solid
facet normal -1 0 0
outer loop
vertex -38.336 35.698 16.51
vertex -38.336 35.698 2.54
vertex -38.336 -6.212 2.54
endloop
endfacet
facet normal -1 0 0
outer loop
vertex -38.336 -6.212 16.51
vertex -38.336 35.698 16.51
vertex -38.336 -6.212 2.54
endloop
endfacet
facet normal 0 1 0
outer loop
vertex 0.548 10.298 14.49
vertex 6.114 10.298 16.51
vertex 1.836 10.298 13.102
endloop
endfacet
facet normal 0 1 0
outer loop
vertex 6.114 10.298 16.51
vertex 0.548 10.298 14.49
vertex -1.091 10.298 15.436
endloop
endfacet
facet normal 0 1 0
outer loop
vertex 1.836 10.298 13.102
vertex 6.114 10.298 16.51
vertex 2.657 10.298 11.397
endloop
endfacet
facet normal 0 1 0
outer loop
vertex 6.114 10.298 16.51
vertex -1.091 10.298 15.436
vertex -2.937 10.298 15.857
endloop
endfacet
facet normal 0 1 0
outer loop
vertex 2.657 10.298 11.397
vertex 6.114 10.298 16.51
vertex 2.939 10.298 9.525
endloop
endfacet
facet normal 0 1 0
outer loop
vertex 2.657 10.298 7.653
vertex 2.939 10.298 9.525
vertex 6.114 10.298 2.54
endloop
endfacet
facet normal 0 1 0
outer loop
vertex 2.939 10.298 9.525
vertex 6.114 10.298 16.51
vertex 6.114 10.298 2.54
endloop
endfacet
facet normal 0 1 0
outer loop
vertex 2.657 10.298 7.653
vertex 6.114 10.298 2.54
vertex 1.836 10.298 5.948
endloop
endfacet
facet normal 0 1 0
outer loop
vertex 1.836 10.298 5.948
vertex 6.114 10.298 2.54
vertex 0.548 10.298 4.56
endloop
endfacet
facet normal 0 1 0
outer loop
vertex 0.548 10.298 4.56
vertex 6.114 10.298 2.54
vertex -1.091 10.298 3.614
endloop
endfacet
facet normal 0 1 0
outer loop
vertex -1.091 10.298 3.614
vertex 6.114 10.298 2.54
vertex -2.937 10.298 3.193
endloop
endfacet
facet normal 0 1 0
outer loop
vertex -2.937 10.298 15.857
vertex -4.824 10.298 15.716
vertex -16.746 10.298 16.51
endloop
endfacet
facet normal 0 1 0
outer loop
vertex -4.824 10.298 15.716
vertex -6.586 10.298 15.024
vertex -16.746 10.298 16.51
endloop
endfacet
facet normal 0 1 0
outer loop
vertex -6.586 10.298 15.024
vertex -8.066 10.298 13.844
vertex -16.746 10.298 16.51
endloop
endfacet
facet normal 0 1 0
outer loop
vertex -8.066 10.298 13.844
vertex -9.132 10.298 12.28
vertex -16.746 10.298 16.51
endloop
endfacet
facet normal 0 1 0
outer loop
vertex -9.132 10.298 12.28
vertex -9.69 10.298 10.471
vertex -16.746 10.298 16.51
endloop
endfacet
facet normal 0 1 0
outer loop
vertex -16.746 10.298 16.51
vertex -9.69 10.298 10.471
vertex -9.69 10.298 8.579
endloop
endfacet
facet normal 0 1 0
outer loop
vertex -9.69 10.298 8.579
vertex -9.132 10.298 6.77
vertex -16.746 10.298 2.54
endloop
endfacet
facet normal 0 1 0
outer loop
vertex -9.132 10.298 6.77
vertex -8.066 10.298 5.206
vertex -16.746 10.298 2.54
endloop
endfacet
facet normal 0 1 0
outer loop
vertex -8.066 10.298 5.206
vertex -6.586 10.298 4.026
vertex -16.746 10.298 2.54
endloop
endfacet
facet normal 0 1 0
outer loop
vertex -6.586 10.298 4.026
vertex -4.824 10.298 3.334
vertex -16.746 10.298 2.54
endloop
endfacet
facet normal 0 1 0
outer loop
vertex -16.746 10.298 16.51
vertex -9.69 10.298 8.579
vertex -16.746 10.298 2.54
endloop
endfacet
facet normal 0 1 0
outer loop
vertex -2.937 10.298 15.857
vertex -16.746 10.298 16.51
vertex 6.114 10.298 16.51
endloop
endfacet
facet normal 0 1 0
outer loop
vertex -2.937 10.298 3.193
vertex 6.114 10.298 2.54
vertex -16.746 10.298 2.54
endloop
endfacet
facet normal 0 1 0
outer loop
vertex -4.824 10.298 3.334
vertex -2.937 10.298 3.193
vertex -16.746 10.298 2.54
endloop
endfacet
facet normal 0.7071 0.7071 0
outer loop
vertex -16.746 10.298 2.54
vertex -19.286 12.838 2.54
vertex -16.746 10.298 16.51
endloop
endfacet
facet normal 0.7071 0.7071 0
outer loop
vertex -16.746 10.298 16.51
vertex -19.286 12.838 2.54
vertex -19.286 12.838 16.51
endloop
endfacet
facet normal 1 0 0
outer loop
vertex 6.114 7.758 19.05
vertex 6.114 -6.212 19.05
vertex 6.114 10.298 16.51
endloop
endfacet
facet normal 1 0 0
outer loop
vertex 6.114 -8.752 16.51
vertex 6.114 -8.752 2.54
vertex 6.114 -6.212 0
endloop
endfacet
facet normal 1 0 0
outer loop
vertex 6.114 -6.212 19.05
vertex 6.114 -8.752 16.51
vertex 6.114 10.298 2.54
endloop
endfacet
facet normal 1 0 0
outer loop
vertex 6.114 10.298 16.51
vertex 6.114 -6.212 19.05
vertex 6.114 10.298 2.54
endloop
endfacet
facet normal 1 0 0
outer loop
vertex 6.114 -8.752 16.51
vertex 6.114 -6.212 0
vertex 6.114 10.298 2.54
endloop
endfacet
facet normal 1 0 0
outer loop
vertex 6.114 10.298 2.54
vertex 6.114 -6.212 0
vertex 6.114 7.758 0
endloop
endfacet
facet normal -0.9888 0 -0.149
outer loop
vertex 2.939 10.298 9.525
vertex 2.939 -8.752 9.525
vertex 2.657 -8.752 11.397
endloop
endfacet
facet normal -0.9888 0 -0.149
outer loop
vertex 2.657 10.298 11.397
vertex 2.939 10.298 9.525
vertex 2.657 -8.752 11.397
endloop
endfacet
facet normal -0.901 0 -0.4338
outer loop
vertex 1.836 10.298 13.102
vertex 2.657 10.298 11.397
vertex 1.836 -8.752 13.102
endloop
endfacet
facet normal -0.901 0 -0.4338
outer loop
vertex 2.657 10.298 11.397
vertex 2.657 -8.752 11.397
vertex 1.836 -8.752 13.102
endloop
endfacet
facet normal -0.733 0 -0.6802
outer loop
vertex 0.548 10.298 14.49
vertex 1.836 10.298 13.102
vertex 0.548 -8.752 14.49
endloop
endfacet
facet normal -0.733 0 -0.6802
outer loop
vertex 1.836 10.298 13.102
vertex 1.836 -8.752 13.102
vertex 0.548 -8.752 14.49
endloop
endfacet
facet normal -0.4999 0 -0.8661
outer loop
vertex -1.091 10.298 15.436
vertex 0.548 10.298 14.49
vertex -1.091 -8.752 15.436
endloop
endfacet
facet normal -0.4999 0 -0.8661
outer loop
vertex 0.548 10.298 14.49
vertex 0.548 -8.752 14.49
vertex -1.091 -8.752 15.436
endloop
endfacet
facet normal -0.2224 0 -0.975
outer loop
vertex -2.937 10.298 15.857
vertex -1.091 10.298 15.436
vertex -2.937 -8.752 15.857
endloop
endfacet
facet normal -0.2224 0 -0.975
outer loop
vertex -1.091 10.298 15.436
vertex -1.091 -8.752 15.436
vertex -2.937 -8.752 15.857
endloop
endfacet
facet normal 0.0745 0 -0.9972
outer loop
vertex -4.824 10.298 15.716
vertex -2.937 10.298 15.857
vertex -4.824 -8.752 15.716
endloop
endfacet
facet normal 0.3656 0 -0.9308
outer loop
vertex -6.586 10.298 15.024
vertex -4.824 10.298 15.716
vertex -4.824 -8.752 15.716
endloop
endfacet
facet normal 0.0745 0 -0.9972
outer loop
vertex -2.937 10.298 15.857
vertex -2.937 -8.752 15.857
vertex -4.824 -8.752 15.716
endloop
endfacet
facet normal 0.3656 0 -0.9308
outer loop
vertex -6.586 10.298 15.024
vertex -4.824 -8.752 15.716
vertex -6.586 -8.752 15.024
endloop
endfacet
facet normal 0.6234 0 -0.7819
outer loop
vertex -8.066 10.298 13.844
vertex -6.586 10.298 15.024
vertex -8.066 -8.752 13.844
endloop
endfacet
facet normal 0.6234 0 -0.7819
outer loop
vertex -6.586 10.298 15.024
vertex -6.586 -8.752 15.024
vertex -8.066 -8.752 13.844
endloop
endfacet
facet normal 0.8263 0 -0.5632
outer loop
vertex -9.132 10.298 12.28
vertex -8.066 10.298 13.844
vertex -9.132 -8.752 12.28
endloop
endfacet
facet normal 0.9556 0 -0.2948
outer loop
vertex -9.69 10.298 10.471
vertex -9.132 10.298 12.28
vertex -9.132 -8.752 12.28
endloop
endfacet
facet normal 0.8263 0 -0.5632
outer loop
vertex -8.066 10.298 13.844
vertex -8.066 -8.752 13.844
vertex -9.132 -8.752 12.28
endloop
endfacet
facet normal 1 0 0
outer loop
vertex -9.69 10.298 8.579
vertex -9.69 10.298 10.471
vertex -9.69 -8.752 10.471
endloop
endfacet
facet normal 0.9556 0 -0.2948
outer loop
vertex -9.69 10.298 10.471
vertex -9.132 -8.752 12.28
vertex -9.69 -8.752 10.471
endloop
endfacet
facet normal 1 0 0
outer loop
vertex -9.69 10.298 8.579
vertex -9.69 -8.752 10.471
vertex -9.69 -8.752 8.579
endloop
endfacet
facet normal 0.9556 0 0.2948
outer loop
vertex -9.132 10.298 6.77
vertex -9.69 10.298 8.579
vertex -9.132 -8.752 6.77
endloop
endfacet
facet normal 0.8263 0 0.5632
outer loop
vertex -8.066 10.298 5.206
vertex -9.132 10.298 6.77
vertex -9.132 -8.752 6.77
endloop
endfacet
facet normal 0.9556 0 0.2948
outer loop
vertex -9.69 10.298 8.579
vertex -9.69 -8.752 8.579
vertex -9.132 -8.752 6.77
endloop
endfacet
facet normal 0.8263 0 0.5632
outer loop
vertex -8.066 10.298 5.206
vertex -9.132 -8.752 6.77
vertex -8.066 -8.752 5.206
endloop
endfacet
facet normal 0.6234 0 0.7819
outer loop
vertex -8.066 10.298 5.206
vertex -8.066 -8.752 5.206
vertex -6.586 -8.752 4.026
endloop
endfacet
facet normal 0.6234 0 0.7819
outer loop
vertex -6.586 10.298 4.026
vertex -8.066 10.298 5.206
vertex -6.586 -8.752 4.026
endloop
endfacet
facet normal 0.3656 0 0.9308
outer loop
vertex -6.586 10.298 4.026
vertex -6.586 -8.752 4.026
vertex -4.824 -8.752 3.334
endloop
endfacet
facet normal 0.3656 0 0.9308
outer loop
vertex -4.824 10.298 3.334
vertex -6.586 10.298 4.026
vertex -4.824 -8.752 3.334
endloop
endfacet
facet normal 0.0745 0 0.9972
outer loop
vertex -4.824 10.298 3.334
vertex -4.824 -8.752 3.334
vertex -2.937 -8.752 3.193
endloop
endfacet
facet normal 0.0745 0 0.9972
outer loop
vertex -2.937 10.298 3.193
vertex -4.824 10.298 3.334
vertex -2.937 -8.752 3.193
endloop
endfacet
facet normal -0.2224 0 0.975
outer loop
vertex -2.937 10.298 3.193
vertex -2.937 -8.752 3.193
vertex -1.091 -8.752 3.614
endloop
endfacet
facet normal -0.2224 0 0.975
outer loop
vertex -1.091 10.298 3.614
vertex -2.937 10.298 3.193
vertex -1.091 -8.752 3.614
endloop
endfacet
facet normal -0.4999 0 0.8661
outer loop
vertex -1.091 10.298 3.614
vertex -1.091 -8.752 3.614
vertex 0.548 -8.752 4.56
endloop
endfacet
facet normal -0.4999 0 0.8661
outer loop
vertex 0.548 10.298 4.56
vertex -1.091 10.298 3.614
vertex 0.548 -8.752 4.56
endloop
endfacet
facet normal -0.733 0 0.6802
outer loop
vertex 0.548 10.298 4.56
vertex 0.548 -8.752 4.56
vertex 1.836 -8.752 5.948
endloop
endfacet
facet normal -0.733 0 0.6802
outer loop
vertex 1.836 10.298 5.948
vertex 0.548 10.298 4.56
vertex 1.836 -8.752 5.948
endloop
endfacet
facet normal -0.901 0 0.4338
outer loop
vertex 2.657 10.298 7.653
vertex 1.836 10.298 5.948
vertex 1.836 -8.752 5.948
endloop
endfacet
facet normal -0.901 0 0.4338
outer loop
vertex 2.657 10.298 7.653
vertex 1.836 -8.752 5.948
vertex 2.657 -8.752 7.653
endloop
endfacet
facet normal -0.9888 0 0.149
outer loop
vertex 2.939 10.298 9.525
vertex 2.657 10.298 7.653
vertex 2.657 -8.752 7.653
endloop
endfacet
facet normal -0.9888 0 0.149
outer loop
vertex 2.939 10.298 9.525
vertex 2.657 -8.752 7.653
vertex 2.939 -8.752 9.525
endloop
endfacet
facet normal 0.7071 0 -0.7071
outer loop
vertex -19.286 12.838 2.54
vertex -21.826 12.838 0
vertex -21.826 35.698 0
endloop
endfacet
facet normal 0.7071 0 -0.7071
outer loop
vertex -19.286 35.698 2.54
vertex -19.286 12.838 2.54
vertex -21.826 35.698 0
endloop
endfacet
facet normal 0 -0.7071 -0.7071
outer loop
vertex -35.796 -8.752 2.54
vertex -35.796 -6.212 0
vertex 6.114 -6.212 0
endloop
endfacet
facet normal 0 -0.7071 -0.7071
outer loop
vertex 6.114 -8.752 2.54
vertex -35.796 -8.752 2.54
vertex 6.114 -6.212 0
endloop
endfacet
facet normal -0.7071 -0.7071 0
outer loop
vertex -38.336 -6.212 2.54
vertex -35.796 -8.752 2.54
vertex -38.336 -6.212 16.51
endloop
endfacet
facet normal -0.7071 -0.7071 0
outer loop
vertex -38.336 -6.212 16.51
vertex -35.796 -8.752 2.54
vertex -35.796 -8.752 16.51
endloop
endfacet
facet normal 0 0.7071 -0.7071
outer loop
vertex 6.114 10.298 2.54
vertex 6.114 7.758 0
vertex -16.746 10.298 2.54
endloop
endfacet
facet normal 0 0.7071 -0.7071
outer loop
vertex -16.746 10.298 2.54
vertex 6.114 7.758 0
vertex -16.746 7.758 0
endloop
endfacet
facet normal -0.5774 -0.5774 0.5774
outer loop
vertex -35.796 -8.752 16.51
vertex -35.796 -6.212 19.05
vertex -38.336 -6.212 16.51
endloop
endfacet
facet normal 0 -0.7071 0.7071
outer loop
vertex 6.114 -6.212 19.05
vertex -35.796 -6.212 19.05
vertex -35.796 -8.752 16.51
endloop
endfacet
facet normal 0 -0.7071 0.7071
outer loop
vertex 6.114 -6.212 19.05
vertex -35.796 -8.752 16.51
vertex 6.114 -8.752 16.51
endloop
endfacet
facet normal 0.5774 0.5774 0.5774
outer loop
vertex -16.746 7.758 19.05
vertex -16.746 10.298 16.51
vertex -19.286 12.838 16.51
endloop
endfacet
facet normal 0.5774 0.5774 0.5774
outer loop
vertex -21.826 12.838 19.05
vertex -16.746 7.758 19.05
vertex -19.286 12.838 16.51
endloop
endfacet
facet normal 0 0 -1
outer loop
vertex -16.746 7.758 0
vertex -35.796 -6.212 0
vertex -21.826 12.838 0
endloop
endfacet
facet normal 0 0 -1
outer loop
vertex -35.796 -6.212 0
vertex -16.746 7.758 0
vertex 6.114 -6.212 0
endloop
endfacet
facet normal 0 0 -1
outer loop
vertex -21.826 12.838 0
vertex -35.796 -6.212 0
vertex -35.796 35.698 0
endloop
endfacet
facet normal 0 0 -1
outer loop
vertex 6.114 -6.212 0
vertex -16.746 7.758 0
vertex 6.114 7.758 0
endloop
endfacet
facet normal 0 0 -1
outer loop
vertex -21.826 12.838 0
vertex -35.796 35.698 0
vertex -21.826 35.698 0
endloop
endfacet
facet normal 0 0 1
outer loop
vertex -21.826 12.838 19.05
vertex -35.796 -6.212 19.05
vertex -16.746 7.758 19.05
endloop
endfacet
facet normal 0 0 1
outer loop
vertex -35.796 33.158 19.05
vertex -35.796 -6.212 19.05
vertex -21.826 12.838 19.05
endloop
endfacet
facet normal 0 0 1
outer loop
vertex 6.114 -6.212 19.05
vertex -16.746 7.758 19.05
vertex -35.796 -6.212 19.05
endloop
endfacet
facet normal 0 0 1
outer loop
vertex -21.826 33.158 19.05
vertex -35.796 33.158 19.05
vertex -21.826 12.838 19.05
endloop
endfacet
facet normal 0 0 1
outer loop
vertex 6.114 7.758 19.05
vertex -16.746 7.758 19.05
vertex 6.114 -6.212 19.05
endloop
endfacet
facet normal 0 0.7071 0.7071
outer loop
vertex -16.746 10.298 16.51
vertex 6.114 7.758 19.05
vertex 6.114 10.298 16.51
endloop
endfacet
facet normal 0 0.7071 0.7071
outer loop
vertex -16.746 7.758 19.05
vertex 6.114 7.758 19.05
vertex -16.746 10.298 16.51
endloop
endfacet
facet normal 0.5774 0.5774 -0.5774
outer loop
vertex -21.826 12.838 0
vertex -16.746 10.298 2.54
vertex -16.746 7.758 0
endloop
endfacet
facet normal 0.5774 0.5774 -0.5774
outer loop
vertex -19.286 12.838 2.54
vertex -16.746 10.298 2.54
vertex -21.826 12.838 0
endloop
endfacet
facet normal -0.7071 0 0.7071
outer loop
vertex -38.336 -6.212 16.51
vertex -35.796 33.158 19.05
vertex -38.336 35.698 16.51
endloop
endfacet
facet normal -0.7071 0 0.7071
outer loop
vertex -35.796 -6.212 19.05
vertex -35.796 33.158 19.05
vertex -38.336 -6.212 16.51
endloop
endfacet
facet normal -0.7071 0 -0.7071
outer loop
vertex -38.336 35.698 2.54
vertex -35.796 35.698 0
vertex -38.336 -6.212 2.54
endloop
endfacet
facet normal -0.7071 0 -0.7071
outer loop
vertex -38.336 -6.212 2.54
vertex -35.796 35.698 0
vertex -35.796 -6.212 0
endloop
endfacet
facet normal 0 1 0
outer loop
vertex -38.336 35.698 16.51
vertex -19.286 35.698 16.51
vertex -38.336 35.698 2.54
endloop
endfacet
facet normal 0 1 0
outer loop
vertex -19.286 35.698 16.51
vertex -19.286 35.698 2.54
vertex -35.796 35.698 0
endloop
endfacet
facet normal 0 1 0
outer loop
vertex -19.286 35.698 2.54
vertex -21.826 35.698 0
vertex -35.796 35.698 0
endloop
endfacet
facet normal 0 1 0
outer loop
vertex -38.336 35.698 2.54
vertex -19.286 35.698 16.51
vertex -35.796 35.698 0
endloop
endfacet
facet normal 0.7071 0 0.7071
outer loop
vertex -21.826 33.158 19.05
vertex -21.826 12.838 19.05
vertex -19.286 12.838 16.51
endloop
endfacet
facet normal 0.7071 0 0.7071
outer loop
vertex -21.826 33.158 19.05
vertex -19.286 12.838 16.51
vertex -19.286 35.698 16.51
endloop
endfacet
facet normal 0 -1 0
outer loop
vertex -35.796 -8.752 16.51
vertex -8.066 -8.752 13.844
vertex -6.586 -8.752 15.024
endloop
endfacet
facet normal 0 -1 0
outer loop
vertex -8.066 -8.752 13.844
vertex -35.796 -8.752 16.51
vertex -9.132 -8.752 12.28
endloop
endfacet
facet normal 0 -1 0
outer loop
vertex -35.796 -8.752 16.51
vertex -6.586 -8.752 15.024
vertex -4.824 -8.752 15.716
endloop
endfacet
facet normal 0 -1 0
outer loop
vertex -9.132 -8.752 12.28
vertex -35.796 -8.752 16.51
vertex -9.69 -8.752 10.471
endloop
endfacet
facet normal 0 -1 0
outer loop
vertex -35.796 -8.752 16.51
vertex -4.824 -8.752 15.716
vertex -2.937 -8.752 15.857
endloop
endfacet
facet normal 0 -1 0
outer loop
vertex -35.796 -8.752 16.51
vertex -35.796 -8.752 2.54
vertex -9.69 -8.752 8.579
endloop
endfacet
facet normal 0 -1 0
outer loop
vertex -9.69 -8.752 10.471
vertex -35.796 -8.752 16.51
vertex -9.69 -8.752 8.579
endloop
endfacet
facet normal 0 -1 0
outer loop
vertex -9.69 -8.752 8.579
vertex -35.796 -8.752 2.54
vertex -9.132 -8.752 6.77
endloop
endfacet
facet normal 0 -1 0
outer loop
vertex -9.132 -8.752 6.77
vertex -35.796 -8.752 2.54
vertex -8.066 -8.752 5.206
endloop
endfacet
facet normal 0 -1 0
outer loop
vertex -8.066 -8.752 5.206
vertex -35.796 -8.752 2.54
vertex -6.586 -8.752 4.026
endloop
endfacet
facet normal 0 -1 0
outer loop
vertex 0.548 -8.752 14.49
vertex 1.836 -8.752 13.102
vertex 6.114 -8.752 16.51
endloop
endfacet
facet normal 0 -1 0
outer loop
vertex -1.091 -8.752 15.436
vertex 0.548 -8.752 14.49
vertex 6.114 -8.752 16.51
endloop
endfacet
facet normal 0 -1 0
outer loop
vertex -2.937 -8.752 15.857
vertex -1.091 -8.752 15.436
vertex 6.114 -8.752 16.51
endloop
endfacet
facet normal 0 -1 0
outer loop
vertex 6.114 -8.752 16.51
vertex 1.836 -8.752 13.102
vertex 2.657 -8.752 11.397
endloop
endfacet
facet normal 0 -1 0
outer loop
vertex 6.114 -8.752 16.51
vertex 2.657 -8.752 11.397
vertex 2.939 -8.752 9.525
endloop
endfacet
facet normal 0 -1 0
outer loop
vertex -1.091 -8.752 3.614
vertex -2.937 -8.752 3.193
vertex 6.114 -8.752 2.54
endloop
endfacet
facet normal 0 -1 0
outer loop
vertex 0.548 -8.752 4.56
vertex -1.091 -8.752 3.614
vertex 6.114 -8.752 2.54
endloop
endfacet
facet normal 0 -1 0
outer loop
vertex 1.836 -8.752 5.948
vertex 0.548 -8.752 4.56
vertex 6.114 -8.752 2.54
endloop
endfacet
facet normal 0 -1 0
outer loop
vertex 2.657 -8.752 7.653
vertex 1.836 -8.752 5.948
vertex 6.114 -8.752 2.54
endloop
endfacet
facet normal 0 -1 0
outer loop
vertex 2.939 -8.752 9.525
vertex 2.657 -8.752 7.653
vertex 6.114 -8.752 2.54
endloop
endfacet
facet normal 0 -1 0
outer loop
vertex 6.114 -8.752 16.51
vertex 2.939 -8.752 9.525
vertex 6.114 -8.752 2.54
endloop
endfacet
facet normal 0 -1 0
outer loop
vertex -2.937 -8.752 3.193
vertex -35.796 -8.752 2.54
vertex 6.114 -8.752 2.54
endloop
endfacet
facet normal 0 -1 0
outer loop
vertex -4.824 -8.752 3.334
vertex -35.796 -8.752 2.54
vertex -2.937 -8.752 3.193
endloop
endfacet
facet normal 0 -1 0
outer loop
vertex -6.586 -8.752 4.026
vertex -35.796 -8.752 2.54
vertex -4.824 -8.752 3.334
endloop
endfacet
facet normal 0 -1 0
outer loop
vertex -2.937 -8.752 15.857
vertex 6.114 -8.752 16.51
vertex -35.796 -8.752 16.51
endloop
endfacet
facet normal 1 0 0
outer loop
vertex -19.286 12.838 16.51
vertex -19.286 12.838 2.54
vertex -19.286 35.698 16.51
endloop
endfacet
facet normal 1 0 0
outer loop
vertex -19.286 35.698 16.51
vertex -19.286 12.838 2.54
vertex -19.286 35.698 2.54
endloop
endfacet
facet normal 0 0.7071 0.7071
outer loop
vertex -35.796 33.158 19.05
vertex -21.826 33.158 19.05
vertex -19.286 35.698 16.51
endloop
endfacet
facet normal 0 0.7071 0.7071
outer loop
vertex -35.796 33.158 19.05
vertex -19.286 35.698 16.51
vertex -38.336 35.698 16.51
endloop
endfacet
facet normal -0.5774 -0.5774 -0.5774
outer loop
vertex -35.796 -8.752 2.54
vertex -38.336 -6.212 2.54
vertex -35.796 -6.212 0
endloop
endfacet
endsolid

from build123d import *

# Parameters (mm, degrees)
F1_DEPTH = 19.05
F2_SIZE  = 2.54
F4_D     = 12.7


with BuildPart() as f1:
    # F0 (on Top) → F1 (new body)
    with BuildSketch(Plane.XY):
        Polygon((-19.2860513926, 35.6976958707), (-38.3360513926, 35.6976958707), (-38.3360513926, -8.7523041293), (6.1139486074, -8.7523041293), (6.1139486074, 10.2976958707), (-19.2860513926, 10.2976958707), align=None)
    extrude(amount=F1_DEPTH)

    # F2
    f2_edges = [f1.edges().sort_by_distance(p)[0] for p in [
        (-19.286051, 10.297696, 9.525),
        (-28.811051, 35.697696, 19.05),
        (-38.336051, 13.472696, 19.05),
        (-16.111051, -8.752304, 19.05),
        (-38.336051, 13.472696, 0),
        (-38.336051, -8.752304, 9.525),
        (-16.111051, -8.752304, 0),
        (-6.586051, 10.297696, 0),
        (-6.586051, 10.297696, 19.05),
        (-19.286051, 22.997696, 0),
        (-19.286051, 22.997696, 19.05),
    ]]
    chamfer(f2_edges, length=F2_SIZE)

    # F4 (through all)
    with Locations(Plane(origin=(0, 10.2976958707, 0), x_dir=(-1, 0, 0), z_dir=(0, 1, 0))):
        with Locations((3.4110513926, 9.525)):
            Hole(F4_D / 2)


solid = f1.part
